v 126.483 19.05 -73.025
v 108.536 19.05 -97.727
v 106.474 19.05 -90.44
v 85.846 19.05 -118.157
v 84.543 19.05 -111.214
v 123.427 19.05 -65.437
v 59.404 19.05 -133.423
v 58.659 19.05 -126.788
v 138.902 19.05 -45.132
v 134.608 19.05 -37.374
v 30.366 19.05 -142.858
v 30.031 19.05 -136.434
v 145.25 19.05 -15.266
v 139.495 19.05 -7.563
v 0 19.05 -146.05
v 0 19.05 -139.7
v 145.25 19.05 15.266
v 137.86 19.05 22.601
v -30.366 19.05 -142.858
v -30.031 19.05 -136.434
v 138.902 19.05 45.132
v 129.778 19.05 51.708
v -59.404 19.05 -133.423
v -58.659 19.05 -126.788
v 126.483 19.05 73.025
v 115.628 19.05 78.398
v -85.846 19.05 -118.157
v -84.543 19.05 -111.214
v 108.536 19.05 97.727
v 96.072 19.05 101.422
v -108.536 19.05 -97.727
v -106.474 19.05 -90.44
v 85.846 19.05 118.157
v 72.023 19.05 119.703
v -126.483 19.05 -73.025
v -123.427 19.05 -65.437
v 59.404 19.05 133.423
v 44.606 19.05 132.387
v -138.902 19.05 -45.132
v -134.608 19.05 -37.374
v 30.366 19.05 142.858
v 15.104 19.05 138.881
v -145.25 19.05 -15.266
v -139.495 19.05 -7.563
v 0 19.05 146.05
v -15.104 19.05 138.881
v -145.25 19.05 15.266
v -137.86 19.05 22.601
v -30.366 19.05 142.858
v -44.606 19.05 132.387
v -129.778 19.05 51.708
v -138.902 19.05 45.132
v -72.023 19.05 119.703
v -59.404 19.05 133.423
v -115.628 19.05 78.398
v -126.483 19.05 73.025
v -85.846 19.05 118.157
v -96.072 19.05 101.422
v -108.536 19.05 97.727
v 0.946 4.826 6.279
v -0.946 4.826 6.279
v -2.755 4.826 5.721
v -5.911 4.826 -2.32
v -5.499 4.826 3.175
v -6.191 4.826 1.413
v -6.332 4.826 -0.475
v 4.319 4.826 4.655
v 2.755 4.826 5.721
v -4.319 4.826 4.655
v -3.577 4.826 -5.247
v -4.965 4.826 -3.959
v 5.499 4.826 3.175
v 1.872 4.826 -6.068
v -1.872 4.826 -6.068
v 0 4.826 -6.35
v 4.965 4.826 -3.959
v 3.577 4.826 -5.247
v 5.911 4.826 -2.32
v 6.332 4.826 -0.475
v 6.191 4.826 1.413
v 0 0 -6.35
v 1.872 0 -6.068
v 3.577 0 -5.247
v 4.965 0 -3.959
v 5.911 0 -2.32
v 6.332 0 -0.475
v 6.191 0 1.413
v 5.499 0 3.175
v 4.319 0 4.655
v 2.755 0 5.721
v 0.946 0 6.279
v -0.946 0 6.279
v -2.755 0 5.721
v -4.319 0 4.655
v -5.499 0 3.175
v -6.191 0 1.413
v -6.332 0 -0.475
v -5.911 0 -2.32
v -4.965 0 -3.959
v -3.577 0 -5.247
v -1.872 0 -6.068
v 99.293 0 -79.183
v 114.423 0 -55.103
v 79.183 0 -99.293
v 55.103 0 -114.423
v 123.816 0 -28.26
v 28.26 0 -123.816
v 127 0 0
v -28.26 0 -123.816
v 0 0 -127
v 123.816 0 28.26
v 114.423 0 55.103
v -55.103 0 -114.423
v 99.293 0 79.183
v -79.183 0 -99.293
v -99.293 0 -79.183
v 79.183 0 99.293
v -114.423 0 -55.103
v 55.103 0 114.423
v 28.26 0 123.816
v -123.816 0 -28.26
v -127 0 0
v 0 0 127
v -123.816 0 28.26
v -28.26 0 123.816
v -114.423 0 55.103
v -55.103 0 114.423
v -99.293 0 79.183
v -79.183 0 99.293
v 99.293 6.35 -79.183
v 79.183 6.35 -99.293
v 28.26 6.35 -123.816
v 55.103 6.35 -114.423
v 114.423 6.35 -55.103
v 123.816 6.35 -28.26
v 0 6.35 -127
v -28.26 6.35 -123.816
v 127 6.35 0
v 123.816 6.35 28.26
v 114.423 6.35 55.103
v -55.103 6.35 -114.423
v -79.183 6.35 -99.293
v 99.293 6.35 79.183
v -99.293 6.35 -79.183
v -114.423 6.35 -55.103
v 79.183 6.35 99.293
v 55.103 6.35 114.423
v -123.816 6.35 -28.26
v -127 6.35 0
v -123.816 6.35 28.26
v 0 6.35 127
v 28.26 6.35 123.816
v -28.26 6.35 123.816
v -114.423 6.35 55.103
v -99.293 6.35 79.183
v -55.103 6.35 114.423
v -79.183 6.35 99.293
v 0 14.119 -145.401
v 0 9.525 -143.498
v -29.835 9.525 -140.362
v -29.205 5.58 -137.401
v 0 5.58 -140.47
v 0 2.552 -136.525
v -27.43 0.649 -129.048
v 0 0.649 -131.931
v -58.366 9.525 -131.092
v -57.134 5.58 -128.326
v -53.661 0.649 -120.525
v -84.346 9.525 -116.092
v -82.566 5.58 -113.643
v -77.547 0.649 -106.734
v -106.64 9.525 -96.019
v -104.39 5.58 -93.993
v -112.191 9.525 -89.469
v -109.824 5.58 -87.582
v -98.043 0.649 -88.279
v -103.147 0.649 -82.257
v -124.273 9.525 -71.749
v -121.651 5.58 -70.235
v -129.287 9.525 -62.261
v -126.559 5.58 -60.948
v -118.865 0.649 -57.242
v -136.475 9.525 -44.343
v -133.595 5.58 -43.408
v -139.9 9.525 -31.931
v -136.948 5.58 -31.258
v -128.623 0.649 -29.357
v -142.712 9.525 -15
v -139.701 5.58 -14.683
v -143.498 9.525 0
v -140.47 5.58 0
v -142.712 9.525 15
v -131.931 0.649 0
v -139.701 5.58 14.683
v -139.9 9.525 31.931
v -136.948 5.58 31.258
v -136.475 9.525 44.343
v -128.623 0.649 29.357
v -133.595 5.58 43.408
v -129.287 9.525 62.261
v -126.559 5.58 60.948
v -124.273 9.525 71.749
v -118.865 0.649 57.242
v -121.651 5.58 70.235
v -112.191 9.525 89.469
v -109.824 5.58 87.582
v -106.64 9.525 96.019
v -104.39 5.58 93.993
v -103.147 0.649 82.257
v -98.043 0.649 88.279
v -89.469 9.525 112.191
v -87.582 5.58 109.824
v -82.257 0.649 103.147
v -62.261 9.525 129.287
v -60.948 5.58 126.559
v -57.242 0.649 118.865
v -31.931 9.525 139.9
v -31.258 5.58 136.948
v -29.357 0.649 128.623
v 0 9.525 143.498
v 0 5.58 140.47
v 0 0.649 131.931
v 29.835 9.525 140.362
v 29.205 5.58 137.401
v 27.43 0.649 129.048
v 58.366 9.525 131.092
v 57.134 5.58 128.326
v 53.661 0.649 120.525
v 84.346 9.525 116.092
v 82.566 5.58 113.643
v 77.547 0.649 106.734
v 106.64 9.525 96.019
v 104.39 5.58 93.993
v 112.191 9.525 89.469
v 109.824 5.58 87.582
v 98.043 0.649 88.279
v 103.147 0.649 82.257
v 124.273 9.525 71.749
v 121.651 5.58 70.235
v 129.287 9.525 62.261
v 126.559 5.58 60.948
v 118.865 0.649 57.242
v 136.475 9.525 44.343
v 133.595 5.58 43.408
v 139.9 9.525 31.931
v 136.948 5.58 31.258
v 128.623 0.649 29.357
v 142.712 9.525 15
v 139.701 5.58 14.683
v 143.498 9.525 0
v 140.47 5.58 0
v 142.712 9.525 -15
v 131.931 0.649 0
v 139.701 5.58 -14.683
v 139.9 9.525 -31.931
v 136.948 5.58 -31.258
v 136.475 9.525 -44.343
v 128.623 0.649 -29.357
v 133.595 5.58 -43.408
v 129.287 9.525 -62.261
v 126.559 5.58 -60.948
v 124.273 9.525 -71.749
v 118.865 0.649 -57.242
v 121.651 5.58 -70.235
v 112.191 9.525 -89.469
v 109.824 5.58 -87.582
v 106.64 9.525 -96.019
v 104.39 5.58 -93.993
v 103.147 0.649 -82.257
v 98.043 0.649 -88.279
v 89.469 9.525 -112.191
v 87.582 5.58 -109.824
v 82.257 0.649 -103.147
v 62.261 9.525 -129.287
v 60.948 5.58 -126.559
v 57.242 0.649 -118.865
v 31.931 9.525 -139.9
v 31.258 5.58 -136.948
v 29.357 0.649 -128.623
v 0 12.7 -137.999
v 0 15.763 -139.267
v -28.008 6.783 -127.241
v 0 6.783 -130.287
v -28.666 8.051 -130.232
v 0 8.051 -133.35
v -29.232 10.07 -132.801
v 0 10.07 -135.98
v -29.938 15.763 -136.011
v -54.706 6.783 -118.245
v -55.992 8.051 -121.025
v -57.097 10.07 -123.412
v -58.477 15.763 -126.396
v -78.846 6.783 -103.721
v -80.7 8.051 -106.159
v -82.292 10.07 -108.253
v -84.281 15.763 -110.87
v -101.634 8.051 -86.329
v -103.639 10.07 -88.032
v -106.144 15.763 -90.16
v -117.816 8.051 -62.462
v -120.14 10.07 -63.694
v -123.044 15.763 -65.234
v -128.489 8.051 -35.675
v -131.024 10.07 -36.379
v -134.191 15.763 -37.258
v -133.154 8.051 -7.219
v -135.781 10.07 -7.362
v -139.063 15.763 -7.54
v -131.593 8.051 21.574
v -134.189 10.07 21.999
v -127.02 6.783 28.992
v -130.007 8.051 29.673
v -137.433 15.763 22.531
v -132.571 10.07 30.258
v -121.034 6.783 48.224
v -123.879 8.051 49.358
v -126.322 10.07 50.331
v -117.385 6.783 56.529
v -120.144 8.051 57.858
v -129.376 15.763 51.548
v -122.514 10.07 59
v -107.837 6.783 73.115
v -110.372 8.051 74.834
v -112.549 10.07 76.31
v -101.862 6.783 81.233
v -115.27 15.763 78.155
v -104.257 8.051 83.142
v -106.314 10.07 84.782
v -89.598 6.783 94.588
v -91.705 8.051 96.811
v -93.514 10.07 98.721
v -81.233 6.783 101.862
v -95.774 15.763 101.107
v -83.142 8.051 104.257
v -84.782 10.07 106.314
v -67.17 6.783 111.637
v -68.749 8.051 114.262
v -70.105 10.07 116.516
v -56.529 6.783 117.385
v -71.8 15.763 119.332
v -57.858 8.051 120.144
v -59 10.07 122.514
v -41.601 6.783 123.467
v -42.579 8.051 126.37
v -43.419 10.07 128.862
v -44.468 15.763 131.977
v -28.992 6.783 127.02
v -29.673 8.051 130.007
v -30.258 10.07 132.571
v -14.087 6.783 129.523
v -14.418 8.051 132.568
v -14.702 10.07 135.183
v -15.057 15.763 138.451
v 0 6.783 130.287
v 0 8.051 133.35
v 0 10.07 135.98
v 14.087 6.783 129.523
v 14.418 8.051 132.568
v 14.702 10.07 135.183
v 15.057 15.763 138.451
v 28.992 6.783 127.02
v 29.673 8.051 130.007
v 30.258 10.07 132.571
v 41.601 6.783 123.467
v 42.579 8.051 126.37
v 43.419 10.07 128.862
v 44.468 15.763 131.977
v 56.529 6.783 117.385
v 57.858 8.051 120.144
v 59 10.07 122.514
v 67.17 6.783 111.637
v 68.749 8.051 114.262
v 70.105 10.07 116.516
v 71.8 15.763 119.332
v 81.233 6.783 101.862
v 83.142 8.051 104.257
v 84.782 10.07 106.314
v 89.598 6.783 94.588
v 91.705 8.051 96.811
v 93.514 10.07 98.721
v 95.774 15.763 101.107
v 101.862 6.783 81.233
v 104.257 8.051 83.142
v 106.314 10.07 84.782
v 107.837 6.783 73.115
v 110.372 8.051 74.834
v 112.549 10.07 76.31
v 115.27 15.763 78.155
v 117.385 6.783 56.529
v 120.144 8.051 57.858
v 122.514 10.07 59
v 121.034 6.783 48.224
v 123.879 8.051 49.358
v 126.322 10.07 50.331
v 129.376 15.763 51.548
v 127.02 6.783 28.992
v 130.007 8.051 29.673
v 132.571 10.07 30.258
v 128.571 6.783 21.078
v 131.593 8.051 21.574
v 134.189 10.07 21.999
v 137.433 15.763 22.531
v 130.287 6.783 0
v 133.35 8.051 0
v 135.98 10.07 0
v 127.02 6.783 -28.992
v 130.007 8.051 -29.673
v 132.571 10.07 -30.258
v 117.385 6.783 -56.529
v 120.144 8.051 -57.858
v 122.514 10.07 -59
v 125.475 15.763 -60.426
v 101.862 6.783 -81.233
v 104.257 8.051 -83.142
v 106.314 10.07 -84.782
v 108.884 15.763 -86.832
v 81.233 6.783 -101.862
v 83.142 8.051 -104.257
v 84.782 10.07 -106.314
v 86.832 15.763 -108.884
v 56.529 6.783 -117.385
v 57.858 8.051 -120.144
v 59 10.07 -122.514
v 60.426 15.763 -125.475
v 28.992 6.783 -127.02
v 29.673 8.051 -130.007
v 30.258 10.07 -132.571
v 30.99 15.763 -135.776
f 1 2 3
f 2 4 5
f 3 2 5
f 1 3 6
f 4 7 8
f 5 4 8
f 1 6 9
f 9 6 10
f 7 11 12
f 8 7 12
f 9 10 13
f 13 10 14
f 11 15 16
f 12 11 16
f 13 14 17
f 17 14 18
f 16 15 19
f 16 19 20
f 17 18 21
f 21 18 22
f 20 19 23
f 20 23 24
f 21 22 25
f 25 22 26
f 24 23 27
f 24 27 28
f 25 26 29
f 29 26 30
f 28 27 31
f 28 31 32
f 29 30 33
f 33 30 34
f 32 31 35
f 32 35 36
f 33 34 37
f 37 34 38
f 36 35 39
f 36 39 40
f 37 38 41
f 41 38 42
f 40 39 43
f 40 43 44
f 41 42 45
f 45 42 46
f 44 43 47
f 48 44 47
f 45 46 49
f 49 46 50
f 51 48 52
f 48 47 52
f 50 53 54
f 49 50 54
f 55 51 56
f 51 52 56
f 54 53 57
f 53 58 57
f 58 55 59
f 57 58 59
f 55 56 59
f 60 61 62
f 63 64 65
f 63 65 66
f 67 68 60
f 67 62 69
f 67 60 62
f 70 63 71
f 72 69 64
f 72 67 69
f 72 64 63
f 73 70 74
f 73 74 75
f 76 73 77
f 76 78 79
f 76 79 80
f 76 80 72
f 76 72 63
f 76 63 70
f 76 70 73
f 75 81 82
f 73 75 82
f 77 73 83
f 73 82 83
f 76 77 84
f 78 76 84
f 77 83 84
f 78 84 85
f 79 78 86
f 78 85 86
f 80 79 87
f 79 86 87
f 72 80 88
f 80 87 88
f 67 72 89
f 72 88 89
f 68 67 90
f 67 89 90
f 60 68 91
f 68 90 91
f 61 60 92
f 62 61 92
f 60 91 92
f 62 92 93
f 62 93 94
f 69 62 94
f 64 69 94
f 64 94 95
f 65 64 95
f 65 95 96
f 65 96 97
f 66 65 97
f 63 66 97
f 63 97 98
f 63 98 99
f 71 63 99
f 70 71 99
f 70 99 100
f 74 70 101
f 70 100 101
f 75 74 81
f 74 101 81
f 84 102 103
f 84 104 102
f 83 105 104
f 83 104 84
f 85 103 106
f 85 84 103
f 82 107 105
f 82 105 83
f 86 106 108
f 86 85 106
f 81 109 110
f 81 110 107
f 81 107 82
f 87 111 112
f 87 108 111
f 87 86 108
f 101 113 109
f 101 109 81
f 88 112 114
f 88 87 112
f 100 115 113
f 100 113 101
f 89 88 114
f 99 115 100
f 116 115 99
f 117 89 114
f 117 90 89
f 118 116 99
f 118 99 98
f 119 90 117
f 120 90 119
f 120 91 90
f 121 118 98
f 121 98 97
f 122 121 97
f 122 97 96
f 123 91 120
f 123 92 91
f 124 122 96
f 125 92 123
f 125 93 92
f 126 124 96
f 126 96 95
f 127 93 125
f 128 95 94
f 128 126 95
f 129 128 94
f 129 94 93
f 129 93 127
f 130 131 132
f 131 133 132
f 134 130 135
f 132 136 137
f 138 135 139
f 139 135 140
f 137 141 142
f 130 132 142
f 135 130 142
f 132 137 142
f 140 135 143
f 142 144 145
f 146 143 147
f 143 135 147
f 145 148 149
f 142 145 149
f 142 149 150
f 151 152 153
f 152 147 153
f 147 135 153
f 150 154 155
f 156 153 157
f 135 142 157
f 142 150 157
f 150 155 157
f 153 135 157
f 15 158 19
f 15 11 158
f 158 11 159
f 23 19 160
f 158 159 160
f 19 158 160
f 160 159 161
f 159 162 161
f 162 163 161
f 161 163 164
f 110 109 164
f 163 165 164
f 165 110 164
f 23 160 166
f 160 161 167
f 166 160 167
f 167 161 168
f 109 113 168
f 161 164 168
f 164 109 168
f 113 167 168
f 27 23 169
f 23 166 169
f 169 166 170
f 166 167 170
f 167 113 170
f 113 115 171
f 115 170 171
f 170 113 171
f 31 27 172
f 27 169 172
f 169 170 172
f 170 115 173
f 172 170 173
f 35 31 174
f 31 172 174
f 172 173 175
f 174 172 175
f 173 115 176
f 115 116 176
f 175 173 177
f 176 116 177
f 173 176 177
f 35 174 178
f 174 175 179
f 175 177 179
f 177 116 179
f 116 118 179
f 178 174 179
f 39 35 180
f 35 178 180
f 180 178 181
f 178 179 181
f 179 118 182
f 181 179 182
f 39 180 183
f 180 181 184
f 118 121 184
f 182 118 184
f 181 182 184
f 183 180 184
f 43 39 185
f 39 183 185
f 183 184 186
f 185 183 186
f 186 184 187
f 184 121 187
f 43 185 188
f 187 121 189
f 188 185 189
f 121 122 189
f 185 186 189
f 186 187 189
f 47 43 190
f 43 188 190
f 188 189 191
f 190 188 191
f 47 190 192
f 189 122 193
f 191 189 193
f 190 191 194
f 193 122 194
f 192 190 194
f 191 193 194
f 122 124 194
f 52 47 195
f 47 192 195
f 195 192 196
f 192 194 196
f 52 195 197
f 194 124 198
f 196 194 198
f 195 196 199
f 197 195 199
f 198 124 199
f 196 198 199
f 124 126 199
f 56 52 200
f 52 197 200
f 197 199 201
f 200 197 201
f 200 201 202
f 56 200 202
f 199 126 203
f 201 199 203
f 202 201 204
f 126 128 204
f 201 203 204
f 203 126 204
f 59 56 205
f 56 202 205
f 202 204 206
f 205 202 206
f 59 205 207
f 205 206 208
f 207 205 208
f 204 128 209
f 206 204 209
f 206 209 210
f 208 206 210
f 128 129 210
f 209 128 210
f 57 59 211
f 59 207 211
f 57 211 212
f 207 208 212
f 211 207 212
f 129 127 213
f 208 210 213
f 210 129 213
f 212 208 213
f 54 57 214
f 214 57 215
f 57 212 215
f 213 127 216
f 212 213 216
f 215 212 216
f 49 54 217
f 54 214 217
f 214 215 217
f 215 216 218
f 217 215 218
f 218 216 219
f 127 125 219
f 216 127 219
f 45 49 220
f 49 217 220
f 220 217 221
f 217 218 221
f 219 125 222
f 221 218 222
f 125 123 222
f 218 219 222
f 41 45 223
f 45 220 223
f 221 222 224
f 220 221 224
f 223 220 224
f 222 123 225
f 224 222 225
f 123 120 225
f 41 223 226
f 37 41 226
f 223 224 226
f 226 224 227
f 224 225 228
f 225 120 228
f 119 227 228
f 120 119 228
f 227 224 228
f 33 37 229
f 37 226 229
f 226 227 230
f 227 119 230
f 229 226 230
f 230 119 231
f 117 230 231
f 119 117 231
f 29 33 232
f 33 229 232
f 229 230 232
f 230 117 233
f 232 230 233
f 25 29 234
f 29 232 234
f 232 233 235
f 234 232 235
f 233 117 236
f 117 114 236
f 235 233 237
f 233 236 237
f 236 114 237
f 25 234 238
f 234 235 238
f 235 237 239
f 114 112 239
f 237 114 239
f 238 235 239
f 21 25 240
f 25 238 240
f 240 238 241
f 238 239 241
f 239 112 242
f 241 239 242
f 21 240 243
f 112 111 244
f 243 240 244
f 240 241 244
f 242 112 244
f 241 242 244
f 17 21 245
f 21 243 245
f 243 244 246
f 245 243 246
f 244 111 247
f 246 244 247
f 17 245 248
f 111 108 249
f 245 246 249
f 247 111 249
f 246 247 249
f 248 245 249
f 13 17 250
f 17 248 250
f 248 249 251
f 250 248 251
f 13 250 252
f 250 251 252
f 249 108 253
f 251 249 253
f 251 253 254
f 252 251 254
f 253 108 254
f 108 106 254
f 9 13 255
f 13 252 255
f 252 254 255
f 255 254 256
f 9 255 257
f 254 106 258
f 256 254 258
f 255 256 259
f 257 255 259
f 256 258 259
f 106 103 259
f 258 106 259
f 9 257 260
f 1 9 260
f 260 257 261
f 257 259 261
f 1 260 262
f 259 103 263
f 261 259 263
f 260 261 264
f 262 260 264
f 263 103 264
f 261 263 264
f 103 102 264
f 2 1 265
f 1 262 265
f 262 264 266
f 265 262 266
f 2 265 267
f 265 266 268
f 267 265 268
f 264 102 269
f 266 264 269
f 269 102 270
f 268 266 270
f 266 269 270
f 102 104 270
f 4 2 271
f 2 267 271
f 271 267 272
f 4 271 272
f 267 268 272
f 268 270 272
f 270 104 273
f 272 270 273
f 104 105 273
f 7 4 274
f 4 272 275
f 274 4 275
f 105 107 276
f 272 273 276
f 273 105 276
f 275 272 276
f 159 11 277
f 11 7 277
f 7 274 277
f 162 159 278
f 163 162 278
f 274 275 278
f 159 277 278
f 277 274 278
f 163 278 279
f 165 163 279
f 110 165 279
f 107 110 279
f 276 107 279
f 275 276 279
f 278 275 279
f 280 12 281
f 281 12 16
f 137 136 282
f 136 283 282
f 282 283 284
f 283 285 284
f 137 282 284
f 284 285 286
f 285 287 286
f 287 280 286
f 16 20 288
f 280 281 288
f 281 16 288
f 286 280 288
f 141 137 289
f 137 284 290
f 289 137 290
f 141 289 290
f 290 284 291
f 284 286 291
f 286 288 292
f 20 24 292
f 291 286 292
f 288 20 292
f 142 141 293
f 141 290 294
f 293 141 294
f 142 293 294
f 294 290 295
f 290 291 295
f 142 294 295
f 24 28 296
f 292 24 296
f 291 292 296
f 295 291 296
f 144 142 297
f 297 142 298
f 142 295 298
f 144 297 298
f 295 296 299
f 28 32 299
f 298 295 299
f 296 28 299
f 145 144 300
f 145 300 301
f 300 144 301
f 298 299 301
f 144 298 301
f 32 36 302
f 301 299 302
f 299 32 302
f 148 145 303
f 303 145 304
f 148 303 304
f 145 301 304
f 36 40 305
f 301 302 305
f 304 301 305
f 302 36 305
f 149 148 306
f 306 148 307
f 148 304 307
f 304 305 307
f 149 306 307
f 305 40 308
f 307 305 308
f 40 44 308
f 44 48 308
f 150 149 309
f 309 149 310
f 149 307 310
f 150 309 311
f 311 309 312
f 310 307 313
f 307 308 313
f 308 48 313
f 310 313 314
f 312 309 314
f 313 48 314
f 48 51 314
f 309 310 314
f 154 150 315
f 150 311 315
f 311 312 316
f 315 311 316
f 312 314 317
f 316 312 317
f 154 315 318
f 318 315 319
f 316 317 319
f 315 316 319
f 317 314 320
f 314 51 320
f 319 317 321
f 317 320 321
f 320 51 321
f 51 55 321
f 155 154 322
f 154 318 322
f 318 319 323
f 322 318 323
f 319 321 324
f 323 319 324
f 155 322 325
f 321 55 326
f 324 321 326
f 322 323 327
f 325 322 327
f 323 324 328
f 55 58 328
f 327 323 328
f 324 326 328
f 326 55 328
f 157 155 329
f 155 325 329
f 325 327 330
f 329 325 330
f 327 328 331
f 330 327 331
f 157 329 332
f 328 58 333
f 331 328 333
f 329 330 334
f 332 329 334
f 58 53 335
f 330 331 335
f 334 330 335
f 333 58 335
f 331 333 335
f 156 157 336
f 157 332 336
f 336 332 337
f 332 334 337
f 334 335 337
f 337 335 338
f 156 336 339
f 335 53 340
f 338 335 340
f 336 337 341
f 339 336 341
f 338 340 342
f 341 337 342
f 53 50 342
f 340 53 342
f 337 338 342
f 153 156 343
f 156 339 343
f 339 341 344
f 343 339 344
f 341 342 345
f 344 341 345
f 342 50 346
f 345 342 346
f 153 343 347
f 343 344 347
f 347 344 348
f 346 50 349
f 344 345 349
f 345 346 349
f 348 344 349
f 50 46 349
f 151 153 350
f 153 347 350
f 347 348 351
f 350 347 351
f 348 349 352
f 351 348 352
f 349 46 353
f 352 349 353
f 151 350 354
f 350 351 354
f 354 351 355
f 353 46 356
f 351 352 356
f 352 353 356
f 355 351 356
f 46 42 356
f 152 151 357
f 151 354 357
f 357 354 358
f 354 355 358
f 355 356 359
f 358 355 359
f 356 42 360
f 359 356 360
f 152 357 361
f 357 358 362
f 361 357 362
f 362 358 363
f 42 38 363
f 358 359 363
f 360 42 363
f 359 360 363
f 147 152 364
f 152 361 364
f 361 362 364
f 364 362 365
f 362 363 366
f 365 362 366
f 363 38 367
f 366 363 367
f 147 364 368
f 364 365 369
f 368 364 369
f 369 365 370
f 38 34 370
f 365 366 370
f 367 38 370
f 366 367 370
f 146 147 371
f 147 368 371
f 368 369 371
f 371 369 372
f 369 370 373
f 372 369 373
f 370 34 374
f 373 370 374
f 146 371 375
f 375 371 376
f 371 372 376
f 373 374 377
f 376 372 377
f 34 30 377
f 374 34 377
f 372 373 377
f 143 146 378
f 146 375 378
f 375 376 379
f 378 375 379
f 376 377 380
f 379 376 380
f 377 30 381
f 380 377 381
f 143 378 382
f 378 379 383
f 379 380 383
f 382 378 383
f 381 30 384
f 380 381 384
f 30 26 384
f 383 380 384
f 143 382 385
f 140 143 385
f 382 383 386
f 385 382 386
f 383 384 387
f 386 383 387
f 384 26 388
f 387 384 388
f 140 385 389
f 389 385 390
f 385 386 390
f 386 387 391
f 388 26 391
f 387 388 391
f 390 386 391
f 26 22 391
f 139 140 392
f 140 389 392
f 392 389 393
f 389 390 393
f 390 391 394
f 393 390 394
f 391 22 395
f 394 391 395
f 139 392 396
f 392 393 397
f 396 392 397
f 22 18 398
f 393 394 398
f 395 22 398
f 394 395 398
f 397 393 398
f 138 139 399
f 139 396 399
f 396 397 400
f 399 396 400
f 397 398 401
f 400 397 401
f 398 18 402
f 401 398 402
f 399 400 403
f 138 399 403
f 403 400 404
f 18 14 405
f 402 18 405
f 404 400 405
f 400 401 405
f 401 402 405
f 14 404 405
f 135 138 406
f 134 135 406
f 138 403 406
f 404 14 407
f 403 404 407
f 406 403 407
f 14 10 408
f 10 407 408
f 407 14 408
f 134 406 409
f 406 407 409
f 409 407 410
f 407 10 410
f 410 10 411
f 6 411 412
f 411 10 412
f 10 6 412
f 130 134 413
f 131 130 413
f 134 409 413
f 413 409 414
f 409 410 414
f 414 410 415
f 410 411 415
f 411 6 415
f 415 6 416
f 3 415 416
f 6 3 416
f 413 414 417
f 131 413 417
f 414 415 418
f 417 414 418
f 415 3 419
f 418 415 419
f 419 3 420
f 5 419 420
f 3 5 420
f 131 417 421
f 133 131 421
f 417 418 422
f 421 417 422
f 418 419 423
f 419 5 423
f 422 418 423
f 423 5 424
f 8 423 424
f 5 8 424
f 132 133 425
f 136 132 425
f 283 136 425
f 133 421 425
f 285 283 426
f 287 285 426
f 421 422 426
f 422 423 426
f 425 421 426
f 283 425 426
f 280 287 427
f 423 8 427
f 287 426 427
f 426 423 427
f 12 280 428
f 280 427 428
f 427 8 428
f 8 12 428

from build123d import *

# Parameters (mm, degrees)
SKETCH1_W          = 127
SKETCH1_H          = 6.35
SKETCH2_R          = 6.35
CUT_EXTRUDE1_DEPTH = 4.826


with BuildPart() as part:
    # Sketch1 → Revolve1 (revolve)
    with BuildSketch(Plane.XY, mode=Mode.PRIVATE) as revolve1_sk:
        with BuildLine():
            Line((127, 0), (127, 6.35))
            ThreePointArc((127, 6.35), (135.980256121, 10.069743879), (139.7, 19.05))
            Line((139.7, 19.05), (146.05, 19.05))
            ThreePointArc((146.05, 19.05), (140.470384182, 5.579615818), (127, 0))
        make_face()
        with Locations((63.5, 3.175)):
            Rectangle(SKETCH1_W, SKETCH1_H)
    revolve(revolve1_sk.sketch.rotate(Axis((0, 0, 0), (0, 1, 0)), 90), axis=Axis((0, 0, 0), (0, 1, 0)))

    # Sketch2 → Cut-Extrude1 (cut)
    with BuildSketch(Plane.XZ):
        with Locations(Location((0, 0, 0), (0, 0, 270))):
            Circle(SKETCH2_R)
    extrude(amount=-CUT_EXTRUDE1_DEPTH, mode=Mode.SUBTRACT)


solid = part.part
